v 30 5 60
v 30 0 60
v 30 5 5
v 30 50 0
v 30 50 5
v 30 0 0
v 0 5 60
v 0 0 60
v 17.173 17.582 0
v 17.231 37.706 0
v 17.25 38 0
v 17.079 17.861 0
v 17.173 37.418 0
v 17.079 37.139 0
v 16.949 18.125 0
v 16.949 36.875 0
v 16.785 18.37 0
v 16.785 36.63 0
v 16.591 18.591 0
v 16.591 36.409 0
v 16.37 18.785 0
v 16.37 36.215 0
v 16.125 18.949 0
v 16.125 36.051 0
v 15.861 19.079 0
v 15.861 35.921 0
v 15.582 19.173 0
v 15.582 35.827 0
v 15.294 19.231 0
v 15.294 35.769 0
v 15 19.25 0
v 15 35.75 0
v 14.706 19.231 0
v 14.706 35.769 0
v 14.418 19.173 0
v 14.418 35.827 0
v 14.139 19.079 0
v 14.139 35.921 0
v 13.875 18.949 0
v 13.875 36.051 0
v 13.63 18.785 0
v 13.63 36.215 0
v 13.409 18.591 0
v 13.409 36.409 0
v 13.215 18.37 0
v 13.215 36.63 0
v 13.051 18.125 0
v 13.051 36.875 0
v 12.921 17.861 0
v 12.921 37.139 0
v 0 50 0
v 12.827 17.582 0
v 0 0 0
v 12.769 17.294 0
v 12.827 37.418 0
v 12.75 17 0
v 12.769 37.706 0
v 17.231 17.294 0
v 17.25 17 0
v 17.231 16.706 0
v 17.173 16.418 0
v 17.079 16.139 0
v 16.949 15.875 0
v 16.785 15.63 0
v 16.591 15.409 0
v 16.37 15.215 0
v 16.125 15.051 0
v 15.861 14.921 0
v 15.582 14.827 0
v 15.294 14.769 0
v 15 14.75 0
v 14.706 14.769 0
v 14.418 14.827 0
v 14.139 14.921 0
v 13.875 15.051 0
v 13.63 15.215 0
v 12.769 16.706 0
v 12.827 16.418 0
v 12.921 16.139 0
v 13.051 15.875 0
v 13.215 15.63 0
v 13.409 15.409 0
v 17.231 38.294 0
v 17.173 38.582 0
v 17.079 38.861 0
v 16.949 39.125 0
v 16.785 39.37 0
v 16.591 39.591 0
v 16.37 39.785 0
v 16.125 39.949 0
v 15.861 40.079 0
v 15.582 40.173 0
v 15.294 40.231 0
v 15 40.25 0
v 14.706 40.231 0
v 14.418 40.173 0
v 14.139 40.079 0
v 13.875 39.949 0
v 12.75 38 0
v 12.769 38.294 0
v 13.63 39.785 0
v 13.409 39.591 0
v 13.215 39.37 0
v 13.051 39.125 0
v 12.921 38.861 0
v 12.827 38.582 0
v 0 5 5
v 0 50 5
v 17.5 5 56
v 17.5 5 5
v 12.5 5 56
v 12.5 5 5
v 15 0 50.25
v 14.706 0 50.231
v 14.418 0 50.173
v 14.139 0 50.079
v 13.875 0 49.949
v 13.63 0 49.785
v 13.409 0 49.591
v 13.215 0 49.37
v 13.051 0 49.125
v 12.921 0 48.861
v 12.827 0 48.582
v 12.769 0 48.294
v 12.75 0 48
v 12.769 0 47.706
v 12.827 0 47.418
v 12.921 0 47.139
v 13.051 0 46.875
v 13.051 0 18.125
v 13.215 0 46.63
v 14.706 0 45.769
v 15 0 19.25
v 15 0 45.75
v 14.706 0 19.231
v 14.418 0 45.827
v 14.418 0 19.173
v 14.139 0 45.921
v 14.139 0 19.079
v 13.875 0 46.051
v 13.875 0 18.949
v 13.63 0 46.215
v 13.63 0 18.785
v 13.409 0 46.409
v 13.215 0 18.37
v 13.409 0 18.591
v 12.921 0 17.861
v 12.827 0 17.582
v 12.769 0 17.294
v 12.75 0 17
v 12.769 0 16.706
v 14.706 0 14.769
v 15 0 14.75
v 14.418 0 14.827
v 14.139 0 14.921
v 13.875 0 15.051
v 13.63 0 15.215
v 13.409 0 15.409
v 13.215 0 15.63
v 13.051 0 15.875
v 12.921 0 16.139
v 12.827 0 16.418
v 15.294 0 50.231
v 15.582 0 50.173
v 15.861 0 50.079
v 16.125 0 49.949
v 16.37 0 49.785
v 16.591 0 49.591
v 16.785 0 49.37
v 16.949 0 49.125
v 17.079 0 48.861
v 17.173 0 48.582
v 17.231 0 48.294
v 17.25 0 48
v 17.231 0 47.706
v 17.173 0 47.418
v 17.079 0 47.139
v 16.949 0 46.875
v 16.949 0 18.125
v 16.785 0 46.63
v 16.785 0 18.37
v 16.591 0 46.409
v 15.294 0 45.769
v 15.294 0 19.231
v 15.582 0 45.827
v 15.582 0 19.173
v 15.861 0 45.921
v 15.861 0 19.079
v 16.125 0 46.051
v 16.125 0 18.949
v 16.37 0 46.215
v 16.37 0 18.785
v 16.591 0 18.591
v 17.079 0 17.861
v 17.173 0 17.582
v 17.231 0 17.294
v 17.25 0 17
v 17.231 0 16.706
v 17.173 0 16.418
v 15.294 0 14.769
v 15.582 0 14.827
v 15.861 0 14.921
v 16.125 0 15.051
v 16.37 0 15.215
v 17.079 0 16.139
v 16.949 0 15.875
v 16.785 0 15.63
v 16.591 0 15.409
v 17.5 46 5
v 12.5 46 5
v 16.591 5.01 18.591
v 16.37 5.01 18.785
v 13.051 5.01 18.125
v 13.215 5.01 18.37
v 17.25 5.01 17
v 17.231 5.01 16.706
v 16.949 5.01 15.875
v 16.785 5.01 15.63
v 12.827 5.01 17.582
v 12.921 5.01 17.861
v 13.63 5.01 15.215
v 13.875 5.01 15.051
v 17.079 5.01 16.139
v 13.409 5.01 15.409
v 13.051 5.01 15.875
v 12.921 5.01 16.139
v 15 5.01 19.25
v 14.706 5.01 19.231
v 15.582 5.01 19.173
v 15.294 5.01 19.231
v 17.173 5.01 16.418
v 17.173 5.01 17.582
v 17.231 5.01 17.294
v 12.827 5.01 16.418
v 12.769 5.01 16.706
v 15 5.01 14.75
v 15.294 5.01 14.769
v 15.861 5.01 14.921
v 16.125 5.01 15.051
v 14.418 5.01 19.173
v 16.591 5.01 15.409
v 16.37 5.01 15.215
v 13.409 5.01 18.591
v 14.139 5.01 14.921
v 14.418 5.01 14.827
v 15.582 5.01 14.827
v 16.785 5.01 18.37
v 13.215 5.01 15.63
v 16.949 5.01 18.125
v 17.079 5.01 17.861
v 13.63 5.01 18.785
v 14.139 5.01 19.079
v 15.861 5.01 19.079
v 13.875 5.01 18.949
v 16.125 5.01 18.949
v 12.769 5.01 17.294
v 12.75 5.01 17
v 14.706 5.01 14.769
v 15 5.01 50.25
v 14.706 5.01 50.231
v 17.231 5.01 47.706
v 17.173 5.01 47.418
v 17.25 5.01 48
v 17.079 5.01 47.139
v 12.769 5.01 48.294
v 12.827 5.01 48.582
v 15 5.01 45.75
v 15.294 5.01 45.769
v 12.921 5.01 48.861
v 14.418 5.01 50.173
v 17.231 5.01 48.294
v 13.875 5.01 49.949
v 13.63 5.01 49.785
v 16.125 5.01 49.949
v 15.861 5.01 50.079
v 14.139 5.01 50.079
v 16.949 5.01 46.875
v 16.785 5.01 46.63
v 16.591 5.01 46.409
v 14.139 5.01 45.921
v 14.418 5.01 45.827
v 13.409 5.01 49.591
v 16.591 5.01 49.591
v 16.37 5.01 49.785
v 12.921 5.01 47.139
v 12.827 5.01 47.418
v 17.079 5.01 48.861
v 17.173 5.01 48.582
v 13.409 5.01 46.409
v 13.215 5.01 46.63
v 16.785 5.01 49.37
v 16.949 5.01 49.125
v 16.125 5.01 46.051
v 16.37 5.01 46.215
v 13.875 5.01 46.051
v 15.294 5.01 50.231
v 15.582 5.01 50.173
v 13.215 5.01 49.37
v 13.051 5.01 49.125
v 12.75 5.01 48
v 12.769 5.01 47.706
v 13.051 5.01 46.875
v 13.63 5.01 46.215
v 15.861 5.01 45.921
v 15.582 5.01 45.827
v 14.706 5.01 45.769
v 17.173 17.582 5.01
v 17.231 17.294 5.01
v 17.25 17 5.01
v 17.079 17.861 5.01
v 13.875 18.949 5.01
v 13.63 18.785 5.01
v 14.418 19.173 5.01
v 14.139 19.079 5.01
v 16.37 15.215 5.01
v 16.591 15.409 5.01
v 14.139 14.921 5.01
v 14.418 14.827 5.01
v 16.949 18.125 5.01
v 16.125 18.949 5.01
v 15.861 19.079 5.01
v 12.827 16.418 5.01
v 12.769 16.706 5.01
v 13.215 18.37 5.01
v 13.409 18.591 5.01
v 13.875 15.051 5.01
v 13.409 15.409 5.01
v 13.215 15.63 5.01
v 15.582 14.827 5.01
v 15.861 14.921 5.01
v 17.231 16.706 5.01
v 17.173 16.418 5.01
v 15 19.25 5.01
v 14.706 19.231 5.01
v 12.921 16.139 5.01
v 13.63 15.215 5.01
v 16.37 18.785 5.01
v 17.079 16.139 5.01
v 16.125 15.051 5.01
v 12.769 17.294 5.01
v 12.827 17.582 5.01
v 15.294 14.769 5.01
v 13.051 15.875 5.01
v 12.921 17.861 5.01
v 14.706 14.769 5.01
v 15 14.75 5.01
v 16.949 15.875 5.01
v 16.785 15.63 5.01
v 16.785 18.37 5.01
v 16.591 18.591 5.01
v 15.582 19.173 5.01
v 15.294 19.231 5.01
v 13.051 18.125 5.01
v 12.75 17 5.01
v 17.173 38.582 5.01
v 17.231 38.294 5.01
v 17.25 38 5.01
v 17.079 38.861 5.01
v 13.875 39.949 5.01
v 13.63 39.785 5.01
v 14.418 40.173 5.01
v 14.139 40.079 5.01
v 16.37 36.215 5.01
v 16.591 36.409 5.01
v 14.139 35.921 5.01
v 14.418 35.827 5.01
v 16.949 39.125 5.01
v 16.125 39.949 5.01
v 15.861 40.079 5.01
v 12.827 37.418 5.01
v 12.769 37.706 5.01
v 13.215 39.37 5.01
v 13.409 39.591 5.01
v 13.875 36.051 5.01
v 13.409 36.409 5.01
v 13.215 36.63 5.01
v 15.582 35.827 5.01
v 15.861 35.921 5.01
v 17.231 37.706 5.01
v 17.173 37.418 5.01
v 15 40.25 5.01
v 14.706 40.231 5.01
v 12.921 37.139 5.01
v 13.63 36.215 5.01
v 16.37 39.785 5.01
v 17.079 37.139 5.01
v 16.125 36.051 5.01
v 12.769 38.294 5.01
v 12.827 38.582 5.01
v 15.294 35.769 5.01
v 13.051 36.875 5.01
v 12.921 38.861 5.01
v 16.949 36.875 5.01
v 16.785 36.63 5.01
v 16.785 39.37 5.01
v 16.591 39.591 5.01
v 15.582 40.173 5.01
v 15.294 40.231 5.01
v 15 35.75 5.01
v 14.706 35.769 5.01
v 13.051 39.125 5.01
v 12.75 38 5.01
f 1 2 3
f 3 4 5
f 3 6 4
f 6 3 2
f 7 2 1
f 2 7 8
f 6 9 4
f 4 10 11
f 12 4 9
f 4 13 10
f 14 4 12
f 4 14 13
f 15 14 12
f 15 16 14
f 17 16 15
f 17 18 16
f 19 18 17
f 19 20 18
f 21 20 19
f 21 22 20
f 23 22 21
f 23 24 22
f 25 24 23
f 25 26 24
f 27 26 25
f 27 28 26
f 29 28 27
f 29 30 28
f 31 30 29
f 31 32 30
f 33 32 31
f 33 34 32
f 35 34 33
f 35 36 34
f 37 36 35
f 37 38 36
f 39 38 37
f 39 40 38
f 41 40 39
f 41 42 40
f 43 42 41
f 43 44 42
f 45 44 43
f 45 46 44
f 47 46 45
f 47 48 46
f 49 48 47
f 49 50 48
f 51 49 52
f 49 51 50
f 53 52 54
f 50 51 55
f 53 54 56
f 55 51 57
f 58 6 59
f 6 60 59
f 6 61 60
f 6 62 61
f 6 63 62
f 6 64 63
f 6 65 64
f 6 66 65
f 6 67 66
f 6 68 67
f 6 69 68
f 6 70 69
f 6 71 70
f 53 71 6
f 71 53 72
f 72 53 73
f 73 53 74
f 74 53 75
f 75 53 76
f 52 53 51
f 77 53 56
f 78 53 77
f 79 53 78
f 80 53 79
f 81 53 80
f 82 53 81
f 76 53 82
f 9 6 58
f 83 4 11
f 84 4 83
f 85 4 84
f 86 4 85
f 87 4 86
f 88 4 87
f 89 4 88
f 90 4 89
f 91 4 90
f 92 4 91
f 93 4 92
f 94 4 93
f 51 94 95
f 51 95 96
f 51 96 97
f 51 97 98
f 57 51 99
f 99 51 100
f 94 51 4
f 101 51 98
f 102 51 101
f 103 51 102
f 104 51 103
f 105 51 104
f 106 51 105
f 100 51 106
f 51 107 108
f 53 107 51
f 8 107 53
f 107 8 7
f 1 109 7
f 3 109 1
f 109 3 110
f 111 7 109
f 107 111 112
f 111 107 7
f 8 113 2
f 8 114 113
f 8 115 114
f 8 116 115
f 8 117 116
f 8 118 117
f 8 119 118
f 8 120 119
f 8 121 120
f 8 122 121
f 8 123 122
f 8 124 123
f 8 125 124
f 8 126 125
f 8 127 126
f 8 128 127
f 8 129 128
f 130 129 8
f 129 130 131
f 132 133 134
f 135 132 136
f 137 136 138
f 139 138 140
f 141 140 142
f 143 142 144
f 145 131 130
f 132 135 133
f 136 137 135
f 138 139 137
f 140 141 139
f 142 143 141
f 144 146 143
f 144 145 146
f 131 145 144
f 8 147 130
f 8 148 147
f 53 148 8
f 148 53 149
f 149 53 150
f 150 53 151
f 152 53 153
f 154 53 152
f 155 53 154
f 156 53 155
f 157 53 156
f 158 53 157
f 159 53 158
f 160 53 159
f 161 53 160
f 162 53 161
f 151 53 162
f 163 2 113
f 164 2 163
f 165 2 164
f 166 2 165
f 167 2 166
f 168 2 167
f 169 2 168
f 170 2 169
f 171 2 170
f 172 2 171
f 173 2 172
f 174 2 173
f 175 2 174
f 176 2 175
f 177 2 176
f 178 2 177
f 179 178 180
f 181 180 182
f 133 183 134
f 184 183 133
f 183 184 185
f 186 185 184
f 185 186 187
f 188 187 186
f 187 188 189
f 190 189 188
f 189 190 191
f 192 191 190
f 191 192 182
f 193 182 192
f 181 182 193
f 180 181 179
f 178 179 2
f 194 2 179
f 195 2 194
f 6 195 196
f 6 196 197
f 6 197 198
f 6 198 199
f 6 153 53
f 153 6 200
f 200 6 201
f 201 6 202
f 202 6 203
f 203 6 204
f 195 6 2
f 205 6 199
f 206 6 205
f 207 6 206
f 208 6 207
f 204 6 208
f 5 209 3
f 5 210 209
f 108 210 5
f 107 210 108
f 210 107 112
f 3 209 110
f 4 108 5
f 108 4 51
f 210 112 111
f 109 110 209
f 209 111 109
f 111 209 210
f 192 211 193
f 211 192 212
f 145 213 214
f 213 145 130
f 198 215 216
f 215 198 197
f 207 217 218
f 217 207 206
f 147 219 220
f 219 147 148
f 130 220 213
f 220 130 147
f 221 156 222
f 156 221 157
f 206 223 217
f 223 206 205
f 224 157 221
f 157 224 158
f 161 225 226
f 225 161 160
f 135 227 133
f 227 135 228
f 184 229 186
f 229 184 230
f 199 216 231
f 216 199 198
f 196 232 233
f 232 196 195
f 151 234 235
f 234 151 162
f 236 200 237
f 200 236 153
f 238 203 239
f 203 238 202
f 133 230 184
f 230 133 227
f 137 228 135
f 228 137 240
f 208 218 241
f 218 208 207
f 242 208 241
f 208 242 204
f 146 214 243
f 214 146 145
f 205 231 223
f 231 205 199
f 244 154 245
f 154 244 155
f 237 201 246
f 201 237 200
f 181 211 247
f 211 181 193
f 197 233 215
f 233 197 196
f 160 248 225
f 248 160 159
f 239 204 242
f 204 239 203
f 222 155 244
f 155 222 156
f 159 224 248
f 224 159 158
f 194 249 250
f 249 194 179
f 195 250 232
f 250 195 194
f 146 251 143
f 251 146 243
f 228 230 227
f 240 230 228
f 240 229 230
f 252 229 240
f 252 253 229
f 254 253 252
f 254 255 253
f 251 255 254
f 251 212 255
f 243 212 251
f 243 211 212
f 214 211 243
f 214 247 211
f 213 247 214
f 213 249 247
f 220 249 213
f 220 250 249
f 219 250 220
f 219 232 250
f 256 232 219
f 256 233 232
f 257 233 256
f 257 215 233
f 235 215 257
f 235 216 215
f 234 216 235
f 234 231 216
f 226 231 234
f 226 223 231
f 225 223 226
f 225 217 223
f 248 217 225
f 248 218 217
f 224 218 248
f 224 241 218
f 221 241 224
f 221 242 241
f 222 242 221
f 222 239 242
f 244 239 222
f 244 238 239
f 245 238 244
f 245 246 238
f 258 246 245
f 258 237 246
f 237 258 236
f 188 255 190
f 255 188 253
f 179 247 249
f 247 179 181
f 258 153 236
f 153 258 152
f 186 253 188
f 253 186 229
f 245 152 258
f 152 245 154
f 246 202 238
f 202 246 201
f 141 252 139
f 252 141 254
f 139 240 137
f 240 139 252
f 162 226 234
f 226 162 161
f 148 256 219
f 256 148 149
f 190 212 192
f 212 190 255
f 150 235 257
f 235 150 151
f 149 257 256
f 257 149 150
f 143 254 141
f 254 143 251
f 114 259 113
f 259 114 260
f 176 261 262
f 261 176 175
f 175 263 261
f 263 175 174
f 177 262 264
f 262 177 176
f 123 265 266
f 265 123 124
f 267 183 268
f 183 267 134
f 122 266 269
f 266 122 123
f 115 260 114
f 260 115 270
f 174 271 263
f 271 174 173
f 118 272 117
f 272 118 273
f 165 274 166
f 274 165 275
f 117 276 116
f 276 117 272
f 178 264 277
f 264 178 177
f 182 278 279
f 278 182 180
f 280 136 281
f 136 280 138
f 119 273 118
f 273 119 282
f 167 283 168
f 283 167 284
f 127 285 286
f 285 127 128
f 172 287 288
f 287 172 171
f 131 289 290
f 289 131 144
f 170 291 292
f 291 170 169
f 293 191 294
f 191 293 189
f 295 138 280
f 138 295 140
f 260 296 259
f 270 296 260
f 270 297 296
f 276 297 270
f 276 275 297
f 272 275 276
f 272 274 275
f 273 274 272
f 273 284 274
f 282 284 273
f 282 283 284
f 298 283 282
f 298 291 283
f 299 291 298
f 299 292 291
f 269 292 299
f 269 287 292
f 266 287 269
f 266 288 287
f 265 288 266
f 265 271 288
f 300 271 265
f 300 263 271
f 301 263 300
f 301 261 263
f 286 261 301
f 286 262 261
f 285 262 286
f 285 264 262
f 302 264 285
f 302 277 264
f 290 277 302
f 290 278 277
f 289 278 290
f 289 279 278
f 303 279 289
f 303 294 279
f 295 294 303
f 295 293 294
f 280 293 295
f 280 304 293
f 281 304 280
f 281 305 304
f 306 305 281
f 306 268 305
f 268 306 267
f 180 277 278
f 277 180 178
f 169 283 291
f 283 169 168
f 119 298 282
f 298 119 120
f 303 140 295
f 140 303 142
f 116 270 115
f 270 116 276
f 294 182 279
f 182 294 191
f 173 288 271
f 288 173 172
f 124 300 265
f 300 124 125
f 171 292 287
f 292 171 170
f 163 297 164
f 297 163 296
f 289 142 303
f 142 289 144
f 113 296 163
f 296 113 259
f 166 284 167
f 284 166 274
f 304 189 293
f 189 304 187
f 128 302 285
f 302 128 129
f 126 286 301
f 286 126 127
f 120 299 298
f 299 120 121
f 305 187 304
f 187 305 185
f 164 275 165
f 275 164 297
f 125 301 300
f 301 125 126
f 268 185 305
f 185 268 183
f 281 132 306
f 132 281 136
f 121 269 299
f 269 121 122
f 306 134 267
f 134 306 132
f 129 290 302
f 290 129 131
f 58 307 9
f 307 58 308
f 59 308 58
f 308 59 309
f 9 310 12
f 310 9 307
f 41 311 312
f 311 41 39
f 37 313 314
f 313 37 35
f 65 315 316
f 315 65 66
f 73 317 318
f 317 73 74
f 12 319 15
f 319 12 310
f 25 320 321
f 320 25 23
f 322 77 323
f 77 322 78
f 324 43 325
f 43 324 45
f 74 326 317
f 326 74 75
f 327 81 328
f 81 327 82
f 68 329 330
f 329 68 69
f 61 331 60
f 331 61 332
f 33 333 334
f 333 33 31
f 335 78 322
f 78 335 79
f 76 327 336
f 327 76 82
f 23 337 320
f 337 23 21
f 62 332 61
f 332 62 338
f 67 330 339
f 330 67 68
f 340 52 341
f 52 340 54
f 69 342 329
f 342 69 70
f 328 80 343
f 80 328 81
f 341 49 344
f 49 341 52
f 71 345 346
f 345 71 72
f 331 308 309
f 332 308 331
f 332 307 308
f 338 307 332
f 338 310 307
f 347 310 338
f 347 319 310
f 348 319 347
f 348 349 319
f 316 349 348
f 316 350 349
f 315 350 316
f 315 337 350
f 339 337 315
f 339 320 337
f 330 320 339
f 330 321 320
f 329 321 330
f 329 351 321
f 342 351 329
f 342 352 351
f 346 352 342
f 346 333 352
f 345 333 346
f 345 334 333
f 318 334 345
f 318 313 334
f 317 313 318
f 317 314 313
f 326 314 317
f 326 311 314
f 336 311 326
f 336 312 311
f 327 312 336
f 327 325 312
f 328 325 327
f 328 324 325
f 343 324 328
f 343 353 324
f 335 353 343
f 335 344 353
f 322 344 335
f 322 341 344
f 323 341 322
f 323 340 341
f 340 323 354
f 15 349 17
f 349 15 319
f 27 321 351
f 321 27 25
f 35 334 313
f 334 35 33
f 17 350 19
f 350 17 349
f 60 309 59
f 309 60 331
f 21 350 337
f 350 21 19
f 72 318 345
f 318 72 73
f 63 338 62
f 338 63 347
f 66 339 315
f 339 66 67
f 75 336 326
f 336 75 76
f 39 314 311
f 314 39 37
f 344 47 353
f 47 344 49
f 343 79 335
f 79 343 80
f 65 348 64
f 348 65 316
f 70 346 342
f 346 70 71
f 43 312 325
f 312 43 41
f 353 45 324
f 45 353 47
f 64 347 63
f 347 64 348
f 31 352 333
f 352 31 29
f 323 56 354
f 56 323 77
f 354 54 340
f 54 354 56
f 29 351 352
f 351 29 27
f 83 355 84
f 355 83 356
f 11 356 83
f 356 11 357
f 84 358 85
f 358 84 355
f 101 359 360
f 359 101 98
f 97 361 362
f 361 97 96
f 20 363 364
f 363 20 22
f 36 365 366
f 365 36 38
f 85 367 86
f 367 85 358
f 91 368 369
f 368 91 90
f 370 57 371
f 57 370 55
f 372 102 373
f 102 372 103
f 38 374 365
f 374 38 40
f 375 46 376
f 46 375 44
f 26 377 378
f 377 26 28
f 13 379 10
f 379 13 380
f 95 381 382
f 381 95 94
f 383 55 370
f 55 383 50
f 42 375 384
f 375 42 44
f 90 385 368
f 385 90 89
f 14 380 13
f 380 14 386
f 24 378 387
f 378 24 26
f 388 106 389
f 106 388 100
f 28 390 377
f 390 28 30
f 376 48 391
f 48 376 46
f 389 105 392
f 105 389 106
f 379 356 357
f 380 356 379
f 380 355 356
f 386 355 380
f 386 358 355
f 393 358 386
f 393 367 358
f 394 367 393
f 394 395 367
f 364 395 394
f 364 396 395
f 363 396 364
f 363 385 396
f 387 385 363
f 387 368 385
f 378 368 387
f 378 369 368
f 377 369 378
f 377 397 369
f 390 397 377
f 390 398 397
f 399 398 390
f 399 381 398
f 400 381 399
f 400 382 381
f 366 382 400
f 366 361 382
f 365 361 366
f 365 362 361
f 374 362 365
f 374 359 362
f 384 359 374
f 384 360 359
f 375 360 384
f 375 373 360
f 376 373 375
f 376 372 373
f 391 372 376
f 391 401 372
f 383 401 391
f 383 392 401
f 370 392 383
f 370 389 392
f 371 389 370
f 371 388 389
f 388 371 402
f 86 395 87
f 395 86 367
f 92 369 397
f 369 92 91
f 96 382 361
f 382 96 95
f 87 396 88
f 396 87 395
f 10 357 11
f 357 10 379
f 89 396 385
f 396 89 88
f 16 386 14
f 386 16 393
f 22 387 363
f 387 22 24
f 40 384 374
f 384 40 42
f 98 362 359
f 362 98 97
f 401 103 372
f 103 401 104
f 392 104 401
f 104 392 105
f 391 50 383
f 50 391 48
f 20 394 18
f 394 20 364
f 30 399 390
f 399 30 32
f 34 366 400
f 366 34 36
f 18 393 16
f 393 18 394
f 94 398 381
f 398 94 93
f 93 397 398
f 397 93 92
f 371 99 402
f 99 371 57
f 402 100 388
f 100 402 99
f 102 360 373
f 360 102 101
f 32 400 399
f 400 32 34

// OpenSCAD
// file: lib/shapes.scad
/*
 * Вспомогательные примитивы. Подключать через use <lib/shapes.scad>.
 */

// Прямоугольник со скруглёнными углами, центрированный в (0,0)
module rrect(w, h, r, fn = 32) {
    r_ = min(r, w / 2 - 0.01, h / 2 - 0.01);
    hull()
        for (sx = [-1, 1], sy = [-1, 1])
            translate([sx * (w / 2 - r_), sy * (h / 2 - r_)])
                circle(r = r_, $fn = fn);
}

// Капсула (slot) длиной l по X, шириной w, центрирована
module slot2d(l, w, fn = 24) {
    hull()
        for (sx = [-1, 1])
            translate([sx * (l - w) / 2, 0]) circle(d = w, $fn = fn);
}

// Скруглённый по вертикальным рёбрам параллелепипед, угол в начале координат
module rbox(size, r, fn = 32) {
    translate([size[0] / 2, size[1] / 2, 0])
        linear_extrude(height = size[2])
            rrect(size[0], size[1], r, fn);
}

// Плавная интерполяция (нулевой наклон на концах → эквивалент большого радиуса)
function smoothstep(t) = t * t * (3 - 2 * t);
function lerp(a, b, t) = a + (b - a) * t;

/*
 * Лофт по Y между двумя скруглёнными прямоугольниками в плоскости XZ.
 * Сечение задано: центр [cx, cz], ширина w, высота h, радиус r.
 * Профиль перехода: smoothstep → тангенциально-непрерывный вход и выход.
 * y0..y1 — продольные координаты. n — число ломтей.
 */
module loft_xz(y0, y1, s0, s1, n = 24, fn = 32) {
    L = y1 - y0;
    for (i = [0 : n - 1]) {
        t0 = i / n;
        t1 = (i + 1) / n;
        hull() {
            section_slab(y0 + t0 * L, s0, s1, smoothstep(t0), fn);
            section_slab(y0 + t1 * L, s0, s1, smoothstep(t1), fn);
        }
    }
}

// Тонкий ломоть сечения на координате y, s = [cx, cz, w, h, r]
module section_slab(y, s0, s1, u, fn) {
    cx = lerp(s0[0], s1[0], u);
    cz = lerp(s0[1], s1[1], u);
    w  = lerp(s0[2], s1[2], u);
    h  = lerp(s0[3], s1[3], u);
    r  = lerp(s0[4], s1[4], u);
    translate([cx, y, cz])
        rotate([90, 0, 0])
            translate([0, 0, -0.005])
                linear_extrude(height = 0.01)
                    rrect(w, h, r, fn);
}

// Отверстие вдоль Y (сквозное), центр (x, z), на глубине от y0 длиной l
module hole_y(x, z, d, y0, l, fn = 32) {
    translate([x, y0 - 0.01, z])
        rotate([-90, 0, 0])
            cylinder(h = l + 0.02, d = d, $fn = fn);
}

// Шестигранное гнездо под гайку вдоль Y
module hex_pocket_y(x, z, af, h, y0) {
    translate([x, y0 - 0.01, z])
        rotate([-90, 0, 0])
            cylinder(h = h + 0.01, d = af / cos(30), $fn = 6);
}

// --- Макеты (не для печати) -------------------------------------------------
module fan_mockup(size = 140, t = 25, hub = 45, hole_pitch = 124.5) {
    // Рамка
    color([0.08, 0.08, 0.09, 0.9])
    difference() {
        translate([0, t, 0]) rotate([90, 0, 0])
            linear_extrude(height = t) rrect(size, size, 6);
        translate([0, t + 0.1, 0]) rotate([90, 0, 0])
            linear_extrude(height = t + 0.2) circle(d = size - 3, $fn = 96);
        for (sx = [-1, 1], sz = [-1, 1])
            hole_y(sx * hole_pitch / 2, sz * hole_pitch / 2, 4.4, -1, t + 2);
    }
    // Ступица и лопасти (условно)
    color([0.45, 0.35, 0.25, 0.95])
    translate([0, t / 2, 0]) rotate([90, 0, 0]) {
        cylinder(h = t * 0.6, d = hub, center = true, $fn = 48);
        for (i = [0 : 6])
            rotate(i * 360 / 7)
                hull() {
                    translate([hub / 2 - 2, -3, 0]) cylinder(h = 2, r = 3, center = true);
                    translate([size / 2 - 10, 10, 0]) cylinder(h = 2, r = 6, center = true);
                }
    }
}

// Паз отверстия вентилятора: hull двух окружностей на межцентровых pmin и pmax
// (sx, sz — квадрант, ±1). 2D, центр вентилятора в (0,0).
module fan_hole_slot2d(sx, sz, pmin, pmax, d, fn = 24) {
    hull() for (p = [pmin, pmax]) translate([sx * p / 2, sz * p / 2]) circle(d = d, $fn = fn);
}

/*
 * Макет MSI EdgeXpert по замерам. Начало координат — левый-передний-нижний угол
 * КОРПУСА (без ножек); ножки уходят в −z. «Левый» — при взгляде спереди.
 *   hc = [w, h, z0]           — сотовая полоса на передней грани (центр по ширине)
 *   bv = [w, d, x0, y0]       — нижняя решётка (x0 от левого края, y0 от передней грани)
 *   rx = [w, h, top]          — задний выхлоп (центр по ширине, top — от верха)
 *   ft = [dia, h, inset_x, inset_y]
 */
module device_mockup(w, d, h, hc, bv, rx, ft) {
    color([0.14, 0.15, 0.16, 0.85]) cube([w, d, h]);
    color([0.35, 0.65, 0.95, 0.95])            // соты — вход
        translate([(w - hc[0]) / 2, -0.4, hc[2]]) cube([hc[0], 0.4, hc[1]]);
    color([0.95, 0.45, 0.3, 0.95])             // задний выхлоп
        translate([(w - rx[0]) / 2, d, h - rx[2] - rx[1]]) cube([rx[0], 0.4, rx[1]]);
    color([0.35, 0.65, 0.95, 0.95])            // нижняя решётка
        translate([bv[2], bv[3], -0.4]) cube([bv[0], bv[1], 0.4]);
    color([0.2, 0.2, 0.2])                     // ножки
        for (fx = [ft[2], w - ft[2]], fy = [ft[3], d - ft[3]])
            translate([fx, fy, -ft[1]]) cylinder(h = ft[1], d = ft[0], $fn = 32);
}
// main file
/*
 * base_plate.scad — алюминиевая плита 3 мм 5U-модуля (покупной лист, сверловка
 * по чертежу docs/drawings/base_plate.svg) + печатные детали:
 *   part="panel_bracket"   — уголок panel↔base_plate (PETG/ASA, M4), 2 шт. — ОПЦИЯ:
 *                            по умолчанию не печатается (use_panel_brackets = false)
 *   part="dc_jack_bracket" — стойка под ПАНЕЛЬНОЕ гнездо 12 В 5.5×2.5 — только при
 *                            dc_jack_inline = false (сейчас гнездо кабельное, стойка не нужна)
 *   part="base_plate"      — сама плита с отверстиями (нужны rack_opening_w, shelf_depth)
 *   part="base_plate_2d"   — 2D-контур для чертежа
 *
 * Координаты модуля: x=0 — ось; y=0 — задняя плоскость панели; z=0 — верх полки.
 */

include <params.scad>
use <lib/shapes.scad>

part = "panel_bracket"; // [panel_bracket, dc_jack_bracket, base_plate, base_plate_2d]

// Сверловка плиты — списки plate_*_holes считаются в params.scad (общие с чертежом).

// С плитой — контур плиты; без плиты — разметка полки (проём стоек × глубина полки).
module base_plate_2d() {
    rack_checks();
    difference() {
        if (use_base_plate) translate([-base_plate_w / 2, base_plate_y0]) square([base_plate_w, base_plate_d]);
        else translate([-rack_opening_w / 2, 0]) square([rack_opening_w, shelf_depth]);
        // plate_tapped: диаметры сверла под резьбу M4 / M3 (метчик по месту)
        for (h = plate_holder_holes) translate(h) circle(d = plate_m4_d, $fn = 24);
        for (h = plate_bracket_holes) translate(h) circle(d = plate_m4_d, $fn = 24);
        for (h = plate_ctrl_holes) translate(h) circle(d = plate_m3_d, $fn = 16);
        for (h = plate_dc_holes) translate(h) circle(d = plate_m3_d, $fn = 16);
    }
}

module base_plate() {
    if (use_base_plate) color([0.82, 0.84, 0.86]) linear_extrude(height = base_plate_t) base_plate_2d();
}

// --- Уголок panel ↔ base_plate ---------------------------------------------
// Вертикальная полка — к панели (2 × M4 через панель, гайки снаружи под
// решёткой НЕ нужны: отверстия вне зоны решётки), горизонтальная — к плите.
// Локально: x — ширина уголка, y — глубина (0 = плоскость панели), z — высота (0 = верх плиты).
module panel_bracket() {
    difference() {
        union() {
            cube([bracket_w, bracket_t, bracket_h]);                  // вертикальная полка
            cube([bracket_w, bracket_d, bracket_t]);                  // горизонтальная полка
            // косынка
            translate([bracket_w / 2 - 2.5, 0, 0]) rotate([90, 0, 90]) linear_extrude(height = 5)
                polygon([[bracket_t, bracket_t], [bracket_d - 4, bracket_t], [bracket_t, bracket_h - 4]]);
        }
        for (z = [bracket_t + 12, bracket_h - 12])
            translate([bracket_w / 2, -0.01, z]) rotate([-90, 0, 0]) cylinder(h = bracket_t + 0.02, d = bracket_hole_d);
        for (y = [bracket_t + 12, bracket_d - 12])
            translate([bracket_w / 2, y, -0.01]) cylinder(h = bracket_t + 0.02, d = bracket_hole_d);
    }
}

// --- Стойка DC-гнезда -------------------------------------------------------
module dc_jack_bracket() {
    assert(!dc_jack_inline, "NOT_NEEDED: гнездо DC кабельное (dc_jack_inline = true) — стойка не нужна");
    assert(known(dc_jack_d), "TO_MEASURE: dc_jack_d (п.15) — посадочный диаметр панельного DC-гнезда");
    h = 30; w = 30; d = 20; t = 4;
    difference() {
        union() { cube([w, t, h]); cube([w, d, t]); }
        translate([w / 2, -0.01, h - 12]) rotate([-90, 0, 0]) cylinder(h = t + 0.02, d = dc_jack_d);
        for (sx = [-1, 1]) translate([w / 2 + sx * 10, d - 7, -0.01]) cylinder(h = t + 0.02, d = m3_clear_d);
    }
}

if (part == "base_plate") base_plate();
else if (part == "base_plate_2d") base_plate_2d();
else if (part == "dc_jack_bracket") dc_jack_bracket();
else panel_bracket();
